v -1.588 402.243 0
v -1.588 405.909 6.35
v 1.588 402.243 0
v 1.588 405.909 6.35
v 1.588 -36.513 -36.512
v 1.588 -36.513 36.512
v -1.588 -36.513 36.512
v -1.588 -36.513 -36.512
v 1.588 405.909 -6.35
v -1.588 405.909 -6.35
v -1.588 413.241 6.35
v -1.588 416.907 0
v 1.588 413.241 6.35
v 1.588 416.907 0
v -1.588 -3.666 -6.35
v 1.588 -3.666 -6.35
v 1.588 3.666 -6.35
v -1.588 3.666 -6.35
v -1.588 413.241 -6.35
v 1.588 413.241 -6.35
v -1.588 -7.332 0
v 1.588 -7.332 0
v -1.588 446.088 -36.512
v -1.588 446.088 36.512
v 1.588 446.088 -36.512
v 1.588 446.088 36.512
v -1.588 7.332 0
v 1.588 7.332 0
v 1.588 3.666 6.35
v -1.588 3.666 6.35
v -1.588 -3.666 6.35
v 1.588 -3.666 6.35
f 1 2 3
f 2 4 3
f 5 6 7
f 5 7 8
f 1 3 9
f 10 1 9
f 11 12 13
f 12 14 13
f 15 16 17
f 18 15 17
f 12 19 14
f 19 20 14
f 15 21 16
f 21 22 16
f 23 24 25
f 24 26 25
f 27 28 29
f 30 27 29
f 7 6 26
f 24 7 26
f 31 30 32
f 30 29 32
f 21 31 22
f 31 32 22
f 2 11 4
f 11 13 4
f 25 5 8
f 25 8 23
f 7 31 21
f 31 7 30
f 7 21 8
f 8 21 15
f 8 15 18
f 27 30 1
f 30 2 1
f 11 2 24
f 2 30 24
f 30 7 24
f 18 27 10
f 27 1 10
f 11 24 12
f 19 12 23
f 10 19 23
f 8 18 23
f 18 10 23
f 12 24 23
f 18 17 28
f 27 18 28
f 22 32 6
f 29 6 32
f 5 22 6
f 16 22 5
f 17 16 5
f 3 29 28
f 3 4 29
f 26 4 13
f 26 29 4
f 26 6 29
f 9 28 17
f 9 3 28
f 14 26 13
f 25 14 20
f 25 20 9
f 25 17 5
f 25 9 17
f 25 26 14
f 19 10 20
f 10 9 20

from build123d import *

# Parameters (mm, degrees)
SKETCH1_W           = 73.025
SKETCH1_H           = 482.6
BOSS_EXTRUDE1_DEPTH = 1.5875


with BuildPart() as part:
    # Sketch1 → Boss-Extrude1 (new body, symmetric)
    with BuildSketch(Plane(origin=(0, 0, 0), x_dir=(0, 0, -1), z_dir=(1, 0, 0))):
        with Locations((0, 204.7875)):
            Rectangle(SKETCH1_W, SKETCH1_H)
        Polygon((0, 7.332348419), (-6.35, 3.666174209), (-6.35, -3.666174209), (0, -7.332348419), (6.35, -3.666174209), (6.35, 3.666174209), align=None, mode=Mode.SUBTRACT)
        Polygon((0, 402.242651581), (6.35, 405.908825791), (6.35, 413.241174209), (0, 416.907348419), (-6.35, 413.241174209), (-6.35, 405.908825791), align=None, mode=Mode.SUBTRACT)
    extrude(amount=BOSS_EXTRUDE1_DEPTH, both=True)


solid = part.part
